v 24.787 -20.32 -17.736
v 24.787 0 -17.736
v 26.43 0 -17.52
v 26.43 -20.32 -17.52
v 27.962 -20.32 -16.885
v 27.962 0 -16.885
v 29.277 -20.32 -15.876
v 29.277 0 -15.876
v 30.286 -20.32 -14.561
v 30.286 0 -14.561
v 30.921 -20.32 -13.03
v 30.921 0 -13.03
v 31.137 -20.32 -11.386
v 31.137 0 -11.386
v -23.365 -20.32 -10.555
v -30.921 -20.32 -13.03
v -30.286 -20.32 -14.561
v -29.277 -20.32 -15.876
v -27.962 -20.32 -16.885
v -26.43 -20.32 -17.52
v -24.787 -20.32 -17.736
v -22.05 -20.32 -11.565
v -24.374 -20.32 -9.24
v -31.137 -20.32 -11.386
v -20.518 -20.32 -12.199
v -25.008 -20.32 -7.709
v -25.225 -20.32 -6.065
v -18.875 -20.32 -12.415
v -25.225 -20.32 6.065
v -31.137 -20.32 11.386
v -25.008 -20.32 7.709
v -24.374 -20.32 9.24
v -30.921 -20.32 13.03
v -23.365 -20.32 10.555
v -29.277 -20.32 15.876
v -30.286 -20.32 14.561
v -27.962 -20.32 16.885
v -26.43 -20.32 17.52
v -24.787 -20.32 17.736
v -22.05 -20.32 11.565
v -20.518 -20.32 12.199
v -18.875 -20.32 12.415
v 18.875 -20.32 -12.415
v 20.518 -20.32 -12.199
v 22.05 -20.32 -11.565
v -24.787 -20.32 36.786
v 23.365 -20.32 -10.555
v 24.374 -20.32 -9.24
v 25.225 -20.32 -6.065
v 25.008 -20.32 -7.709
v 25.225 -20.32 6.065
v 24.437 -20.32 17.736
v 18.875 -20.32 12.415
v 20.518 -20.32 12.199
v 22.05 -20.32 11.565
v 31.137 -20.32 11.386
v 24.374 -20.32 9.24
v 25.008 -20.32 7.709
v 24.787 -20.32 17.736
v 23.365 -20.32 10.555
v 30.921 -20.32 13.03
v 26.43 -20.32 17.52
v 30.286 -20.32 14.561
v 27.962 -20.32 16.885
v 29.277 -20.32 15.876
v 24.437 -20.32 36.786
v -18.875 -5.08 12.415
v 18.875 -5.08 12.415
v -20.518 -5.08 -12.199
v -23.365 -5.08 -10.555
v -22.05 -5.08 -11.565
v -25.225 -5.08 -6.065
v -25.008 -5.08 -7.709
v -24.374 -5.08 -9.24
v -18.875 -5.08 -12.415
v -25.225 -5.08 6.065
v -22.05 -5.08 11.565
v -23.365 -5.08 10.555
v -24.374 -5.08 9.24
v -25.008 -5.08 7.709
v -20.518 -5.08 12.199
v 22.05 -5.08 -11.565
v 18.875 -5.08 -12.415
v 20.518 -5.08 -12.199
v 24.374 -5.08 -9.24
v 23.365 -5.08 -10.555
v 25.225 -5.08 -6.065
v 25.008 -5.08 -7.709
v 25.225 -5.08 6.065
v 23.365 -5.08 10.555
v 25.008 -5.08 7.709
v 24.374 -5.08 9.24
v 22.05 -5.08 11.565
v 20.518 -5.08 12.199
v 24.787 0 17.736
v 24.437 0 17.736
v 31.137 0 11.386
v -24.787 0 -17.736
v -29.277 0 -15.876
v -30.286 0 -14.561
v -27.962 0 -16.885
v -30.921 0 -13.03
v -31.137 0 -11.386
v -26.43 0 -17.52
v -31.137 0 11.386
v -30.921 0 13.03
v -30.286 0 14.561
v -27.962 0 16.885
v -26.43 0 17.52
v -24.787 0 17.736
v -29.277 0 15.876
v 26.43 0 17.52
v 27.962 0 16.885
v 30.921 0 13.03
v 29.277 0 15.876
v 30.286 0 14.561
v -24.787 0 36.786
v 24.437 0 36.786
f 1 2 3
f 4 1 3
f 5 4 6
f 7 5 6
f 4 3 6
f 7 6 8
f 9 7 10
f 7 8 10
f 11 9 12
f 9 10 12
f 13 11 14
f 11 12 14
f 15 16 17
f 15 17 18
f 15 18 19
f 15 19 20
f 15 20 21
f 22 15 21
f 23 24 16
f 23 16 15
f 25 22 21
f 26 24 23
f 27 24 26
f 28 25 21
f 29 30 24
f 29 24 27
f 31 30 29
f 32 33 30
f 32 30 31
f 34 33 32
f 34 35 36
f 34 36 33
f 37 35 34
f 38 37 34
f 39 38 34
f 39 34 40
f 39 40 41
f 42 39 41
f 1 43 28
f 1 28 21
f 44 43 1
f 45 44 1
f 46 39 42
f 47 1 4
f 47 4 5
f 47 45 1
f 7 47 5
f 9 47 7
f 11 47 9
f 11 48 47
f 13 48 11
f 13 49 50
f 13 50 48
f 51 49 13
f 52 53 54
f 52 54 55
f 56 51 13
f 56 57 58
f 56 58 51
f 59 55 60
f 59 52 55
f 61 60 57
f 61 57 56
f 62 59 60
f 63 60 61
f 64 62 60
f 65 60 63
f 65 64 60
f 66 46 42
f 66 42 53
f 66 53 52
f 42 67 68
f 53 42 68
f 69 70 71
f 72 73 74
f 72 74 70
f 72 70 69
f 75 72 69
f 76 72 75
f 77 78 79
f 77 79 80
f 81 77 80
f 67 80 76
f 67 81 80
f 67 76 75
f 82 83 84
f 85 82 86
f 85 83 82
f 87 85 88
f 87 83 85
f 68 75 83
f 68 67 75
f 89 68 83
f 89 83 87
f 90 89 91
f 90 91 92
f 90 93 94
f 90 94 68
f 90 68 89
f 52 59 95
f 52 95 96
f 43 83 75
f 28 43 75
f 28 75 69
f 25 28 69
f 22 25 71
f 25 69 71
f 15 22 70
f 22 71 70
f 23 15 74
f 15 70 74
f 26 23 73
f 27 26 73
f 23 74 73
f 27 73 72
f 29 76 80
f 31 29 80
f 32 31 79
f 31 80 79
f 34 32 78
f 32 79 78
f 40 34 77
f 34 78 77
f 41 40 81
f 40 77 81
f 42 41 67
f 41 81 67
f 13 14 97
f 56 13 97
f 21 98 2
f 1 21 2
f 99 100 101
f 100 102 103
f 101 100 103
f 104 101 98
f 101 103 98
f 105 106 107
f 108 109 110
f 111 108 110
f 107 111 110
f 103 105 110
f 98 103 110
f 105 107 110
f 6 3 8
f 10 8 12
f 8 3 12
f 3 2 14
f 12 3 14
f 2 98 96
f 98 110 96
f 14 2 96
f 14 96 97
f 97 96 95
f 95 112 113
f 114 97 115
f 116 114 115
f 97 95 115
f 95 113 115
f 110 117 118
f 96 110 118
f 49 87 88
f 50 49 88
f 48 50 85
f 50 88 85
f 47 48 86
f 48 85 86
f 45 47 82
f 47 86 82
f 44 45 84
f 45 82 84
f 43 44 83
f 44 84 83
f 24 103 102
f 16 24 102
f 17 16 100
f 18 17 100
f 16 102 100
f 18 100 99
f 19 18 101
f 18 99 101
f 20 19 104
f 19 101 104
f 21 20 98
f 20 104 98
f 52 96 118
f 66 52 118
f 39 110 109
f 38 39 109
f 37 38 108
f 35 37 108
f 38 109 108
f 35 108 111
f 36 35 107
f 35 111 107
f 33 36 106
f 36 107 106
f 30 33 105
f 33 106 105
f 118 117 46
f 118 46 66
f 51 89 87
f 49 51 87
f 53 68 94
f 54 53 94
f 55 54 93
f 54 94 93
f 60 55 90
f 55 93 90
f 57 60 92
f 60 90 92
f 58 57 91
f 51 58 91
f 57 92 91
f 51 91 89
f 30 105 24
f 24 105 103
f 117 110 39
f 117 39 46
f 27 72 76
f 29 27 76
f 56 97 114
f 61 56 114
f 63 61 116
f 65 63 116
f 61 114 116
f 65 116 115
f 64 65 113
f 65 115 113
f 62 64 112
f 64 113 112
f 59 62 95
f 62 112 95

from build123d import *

# Parameters (mm, degrees)
F1_DEPTH = 19.05
F2_DEPTH = 5.08
F0_W     = 49.223448
F0_H     = 19.05
F3_DEPTH = 20.32


with BuildPart() as f1:
    # F0 (on Front) → F1 (new body)
    with BuildSketch(Plane.XZ):
        with BuildLine():
            Line((24.436552, 17.736208), (-24.786896, 17.736208))
            ThreePointArc((-24.786896, 17.736208), (-29.277025, 15.876336), (-31.136896, 11.386208))
            Line((-31.136896, 11.386208), (-31.136896, -11.386208))
            ThreePointArc((-31.136896, -11.386208), (-29.277025, -15.876336), (-24.786896, -17.736208))
            Line((-24.786896, -17.736208), (24.786896, -17.736208))
            ThreePointArc((24.786896, -17.736208), (29.277025, -15.876336), (31.136896, -11.386208))
            Line((31.136896, -11.386208), (31.136896, 11.386208))
            ThreePointArc((31.136896, 11.386208), (29.277025, 15.876336), (24.786896, 17.736208))
            Line((24.786896, 17.736208), (24.436552, 17.736208))
        make_face()
        with BuildLine():
            ThreePointArc((-25.224827, 6.065345), (-23.364955, 10.555473), (-18.874827, 12.415345))
            Line((-18.874827, 12.415345), (18.874827, 12.415345))
            ThreePointArc((18.874827, 12.415345), (23.364955, 10.555473), (25.224827, 6.065345))
            Line((25.224827, 6.065345), (25.224827, -6.065345))
            ThreePointArc((25.224827, -6.065345), (23.364955, -10.555473), (18.874827, -12.415345))
            Line((18.874827, -12.415345), (-18.874827, -12.415345))
            ThreePointArc((-18.874827, -12.415345), (-23.364955, -10.555473), (-25.224827, -6.065345))
            Line((-25.224827, -6.065345), (-25.224827, 6.065345))
        make_face(mode=Mode.SUBTRACT)
    extrude(amount=F1_DEPTH)

    # F0 (on Front) → F2 (join)
    with BuildSketch(Plane.XZ):
        with BuildLine():
            Line((18.874827, 12.415345), (-18.874827, 12.415345))
            ThreePointArc((-18.874827, 12.415345), (-23.364955, 10.555473), (-25.224827, 6.065345))
            Line((-25.224827, 6.065345), (-25.224827, -6.065345))
            ThreePointArc((-25.224827, -6.065345), (-23.364955, -10.555473), (-18.874827, -12.415345))
            Line((-18.874827, -12.415345), (18.874827, -12.415345))
            ThreePointArc((18.874827, -12.415345), (23.364955, -10.555473), (25.224827, -6.065345))
            Line((25.224827, -6.065345), (25.224827, 6.065345))
            ThreePointArc((25.224827, 6.065345), (23.364955, 10.555473), (18.874827, 12.415345))
        make_face()
    extrude(amount=F2_DEPTH)

    # F0 (on Front) → F3 (join)
    with BuildSketch(Plane.XZ):
        with Locations((-0.175172, 27.261208)):
            Rectangle(F0_W, F0_H)
        with BuildLine():
            Line((24.436552, 17.736208), (-24.786896, 17.736208))
            ThreePointArc((-24.786896, 17.736208), (-29.277025, 15.876336), (-31.136896, 11.386208))
            Line((-31.136896, 11.386208), (-31.136896, -11.386208))
            ThreePointArc((-31.136896, -11.386208), (-29.277025, -15.876336), (-24.786896, -17.736208))
            Line((-24.786896, -17.736208), (24.786896, -17.736208))
            ThreePointArc((24.786896, -17.736208), (29.277025, -15.876336), (31.136896, -11.386208))
            Line((31.136896, -11.386208), (31.136896, 11.386208))
            ThreePointArc((31.136896, 11.386208), (29.277025, 15.876336), (24.786896, 17.736208))
            Line((24.786896, 17.736208), (24.436552, 17.736208))
        make_face()
        with BuildLine():
            ThreePointArc((-25.224827, 6.065345), (-23.364955, 10.555473), (-18.874827, 12.415345))
            Line((-18.874827, 12.415345), (18.874827, 12.415345))
            ThreePointArc((18.874827, 12.415345), (23.364955, 10.555473), (25.224827, 6.065345))
            Line((25.224827, 6.065345), (25.224827, -6.065345))
            ThreePointArc((25.224827, -6.065345), (23.364955, -10.555473), (18.874827, -12.415345))
            Line((18.874827, -12.415345), (-18.874827, -12.415345))
            ThreePointArc((-18.874827, -12.415345), (-23.364955, -10.555473), (-25.224827, -6.065345))
            Line((-25.224827, -6.065345), (-25.224827, 6.065345))
        make_face(mode=Mode.SUBTRACT)
    extrude(amount=F3_DEPTH)


solid = f1.part
